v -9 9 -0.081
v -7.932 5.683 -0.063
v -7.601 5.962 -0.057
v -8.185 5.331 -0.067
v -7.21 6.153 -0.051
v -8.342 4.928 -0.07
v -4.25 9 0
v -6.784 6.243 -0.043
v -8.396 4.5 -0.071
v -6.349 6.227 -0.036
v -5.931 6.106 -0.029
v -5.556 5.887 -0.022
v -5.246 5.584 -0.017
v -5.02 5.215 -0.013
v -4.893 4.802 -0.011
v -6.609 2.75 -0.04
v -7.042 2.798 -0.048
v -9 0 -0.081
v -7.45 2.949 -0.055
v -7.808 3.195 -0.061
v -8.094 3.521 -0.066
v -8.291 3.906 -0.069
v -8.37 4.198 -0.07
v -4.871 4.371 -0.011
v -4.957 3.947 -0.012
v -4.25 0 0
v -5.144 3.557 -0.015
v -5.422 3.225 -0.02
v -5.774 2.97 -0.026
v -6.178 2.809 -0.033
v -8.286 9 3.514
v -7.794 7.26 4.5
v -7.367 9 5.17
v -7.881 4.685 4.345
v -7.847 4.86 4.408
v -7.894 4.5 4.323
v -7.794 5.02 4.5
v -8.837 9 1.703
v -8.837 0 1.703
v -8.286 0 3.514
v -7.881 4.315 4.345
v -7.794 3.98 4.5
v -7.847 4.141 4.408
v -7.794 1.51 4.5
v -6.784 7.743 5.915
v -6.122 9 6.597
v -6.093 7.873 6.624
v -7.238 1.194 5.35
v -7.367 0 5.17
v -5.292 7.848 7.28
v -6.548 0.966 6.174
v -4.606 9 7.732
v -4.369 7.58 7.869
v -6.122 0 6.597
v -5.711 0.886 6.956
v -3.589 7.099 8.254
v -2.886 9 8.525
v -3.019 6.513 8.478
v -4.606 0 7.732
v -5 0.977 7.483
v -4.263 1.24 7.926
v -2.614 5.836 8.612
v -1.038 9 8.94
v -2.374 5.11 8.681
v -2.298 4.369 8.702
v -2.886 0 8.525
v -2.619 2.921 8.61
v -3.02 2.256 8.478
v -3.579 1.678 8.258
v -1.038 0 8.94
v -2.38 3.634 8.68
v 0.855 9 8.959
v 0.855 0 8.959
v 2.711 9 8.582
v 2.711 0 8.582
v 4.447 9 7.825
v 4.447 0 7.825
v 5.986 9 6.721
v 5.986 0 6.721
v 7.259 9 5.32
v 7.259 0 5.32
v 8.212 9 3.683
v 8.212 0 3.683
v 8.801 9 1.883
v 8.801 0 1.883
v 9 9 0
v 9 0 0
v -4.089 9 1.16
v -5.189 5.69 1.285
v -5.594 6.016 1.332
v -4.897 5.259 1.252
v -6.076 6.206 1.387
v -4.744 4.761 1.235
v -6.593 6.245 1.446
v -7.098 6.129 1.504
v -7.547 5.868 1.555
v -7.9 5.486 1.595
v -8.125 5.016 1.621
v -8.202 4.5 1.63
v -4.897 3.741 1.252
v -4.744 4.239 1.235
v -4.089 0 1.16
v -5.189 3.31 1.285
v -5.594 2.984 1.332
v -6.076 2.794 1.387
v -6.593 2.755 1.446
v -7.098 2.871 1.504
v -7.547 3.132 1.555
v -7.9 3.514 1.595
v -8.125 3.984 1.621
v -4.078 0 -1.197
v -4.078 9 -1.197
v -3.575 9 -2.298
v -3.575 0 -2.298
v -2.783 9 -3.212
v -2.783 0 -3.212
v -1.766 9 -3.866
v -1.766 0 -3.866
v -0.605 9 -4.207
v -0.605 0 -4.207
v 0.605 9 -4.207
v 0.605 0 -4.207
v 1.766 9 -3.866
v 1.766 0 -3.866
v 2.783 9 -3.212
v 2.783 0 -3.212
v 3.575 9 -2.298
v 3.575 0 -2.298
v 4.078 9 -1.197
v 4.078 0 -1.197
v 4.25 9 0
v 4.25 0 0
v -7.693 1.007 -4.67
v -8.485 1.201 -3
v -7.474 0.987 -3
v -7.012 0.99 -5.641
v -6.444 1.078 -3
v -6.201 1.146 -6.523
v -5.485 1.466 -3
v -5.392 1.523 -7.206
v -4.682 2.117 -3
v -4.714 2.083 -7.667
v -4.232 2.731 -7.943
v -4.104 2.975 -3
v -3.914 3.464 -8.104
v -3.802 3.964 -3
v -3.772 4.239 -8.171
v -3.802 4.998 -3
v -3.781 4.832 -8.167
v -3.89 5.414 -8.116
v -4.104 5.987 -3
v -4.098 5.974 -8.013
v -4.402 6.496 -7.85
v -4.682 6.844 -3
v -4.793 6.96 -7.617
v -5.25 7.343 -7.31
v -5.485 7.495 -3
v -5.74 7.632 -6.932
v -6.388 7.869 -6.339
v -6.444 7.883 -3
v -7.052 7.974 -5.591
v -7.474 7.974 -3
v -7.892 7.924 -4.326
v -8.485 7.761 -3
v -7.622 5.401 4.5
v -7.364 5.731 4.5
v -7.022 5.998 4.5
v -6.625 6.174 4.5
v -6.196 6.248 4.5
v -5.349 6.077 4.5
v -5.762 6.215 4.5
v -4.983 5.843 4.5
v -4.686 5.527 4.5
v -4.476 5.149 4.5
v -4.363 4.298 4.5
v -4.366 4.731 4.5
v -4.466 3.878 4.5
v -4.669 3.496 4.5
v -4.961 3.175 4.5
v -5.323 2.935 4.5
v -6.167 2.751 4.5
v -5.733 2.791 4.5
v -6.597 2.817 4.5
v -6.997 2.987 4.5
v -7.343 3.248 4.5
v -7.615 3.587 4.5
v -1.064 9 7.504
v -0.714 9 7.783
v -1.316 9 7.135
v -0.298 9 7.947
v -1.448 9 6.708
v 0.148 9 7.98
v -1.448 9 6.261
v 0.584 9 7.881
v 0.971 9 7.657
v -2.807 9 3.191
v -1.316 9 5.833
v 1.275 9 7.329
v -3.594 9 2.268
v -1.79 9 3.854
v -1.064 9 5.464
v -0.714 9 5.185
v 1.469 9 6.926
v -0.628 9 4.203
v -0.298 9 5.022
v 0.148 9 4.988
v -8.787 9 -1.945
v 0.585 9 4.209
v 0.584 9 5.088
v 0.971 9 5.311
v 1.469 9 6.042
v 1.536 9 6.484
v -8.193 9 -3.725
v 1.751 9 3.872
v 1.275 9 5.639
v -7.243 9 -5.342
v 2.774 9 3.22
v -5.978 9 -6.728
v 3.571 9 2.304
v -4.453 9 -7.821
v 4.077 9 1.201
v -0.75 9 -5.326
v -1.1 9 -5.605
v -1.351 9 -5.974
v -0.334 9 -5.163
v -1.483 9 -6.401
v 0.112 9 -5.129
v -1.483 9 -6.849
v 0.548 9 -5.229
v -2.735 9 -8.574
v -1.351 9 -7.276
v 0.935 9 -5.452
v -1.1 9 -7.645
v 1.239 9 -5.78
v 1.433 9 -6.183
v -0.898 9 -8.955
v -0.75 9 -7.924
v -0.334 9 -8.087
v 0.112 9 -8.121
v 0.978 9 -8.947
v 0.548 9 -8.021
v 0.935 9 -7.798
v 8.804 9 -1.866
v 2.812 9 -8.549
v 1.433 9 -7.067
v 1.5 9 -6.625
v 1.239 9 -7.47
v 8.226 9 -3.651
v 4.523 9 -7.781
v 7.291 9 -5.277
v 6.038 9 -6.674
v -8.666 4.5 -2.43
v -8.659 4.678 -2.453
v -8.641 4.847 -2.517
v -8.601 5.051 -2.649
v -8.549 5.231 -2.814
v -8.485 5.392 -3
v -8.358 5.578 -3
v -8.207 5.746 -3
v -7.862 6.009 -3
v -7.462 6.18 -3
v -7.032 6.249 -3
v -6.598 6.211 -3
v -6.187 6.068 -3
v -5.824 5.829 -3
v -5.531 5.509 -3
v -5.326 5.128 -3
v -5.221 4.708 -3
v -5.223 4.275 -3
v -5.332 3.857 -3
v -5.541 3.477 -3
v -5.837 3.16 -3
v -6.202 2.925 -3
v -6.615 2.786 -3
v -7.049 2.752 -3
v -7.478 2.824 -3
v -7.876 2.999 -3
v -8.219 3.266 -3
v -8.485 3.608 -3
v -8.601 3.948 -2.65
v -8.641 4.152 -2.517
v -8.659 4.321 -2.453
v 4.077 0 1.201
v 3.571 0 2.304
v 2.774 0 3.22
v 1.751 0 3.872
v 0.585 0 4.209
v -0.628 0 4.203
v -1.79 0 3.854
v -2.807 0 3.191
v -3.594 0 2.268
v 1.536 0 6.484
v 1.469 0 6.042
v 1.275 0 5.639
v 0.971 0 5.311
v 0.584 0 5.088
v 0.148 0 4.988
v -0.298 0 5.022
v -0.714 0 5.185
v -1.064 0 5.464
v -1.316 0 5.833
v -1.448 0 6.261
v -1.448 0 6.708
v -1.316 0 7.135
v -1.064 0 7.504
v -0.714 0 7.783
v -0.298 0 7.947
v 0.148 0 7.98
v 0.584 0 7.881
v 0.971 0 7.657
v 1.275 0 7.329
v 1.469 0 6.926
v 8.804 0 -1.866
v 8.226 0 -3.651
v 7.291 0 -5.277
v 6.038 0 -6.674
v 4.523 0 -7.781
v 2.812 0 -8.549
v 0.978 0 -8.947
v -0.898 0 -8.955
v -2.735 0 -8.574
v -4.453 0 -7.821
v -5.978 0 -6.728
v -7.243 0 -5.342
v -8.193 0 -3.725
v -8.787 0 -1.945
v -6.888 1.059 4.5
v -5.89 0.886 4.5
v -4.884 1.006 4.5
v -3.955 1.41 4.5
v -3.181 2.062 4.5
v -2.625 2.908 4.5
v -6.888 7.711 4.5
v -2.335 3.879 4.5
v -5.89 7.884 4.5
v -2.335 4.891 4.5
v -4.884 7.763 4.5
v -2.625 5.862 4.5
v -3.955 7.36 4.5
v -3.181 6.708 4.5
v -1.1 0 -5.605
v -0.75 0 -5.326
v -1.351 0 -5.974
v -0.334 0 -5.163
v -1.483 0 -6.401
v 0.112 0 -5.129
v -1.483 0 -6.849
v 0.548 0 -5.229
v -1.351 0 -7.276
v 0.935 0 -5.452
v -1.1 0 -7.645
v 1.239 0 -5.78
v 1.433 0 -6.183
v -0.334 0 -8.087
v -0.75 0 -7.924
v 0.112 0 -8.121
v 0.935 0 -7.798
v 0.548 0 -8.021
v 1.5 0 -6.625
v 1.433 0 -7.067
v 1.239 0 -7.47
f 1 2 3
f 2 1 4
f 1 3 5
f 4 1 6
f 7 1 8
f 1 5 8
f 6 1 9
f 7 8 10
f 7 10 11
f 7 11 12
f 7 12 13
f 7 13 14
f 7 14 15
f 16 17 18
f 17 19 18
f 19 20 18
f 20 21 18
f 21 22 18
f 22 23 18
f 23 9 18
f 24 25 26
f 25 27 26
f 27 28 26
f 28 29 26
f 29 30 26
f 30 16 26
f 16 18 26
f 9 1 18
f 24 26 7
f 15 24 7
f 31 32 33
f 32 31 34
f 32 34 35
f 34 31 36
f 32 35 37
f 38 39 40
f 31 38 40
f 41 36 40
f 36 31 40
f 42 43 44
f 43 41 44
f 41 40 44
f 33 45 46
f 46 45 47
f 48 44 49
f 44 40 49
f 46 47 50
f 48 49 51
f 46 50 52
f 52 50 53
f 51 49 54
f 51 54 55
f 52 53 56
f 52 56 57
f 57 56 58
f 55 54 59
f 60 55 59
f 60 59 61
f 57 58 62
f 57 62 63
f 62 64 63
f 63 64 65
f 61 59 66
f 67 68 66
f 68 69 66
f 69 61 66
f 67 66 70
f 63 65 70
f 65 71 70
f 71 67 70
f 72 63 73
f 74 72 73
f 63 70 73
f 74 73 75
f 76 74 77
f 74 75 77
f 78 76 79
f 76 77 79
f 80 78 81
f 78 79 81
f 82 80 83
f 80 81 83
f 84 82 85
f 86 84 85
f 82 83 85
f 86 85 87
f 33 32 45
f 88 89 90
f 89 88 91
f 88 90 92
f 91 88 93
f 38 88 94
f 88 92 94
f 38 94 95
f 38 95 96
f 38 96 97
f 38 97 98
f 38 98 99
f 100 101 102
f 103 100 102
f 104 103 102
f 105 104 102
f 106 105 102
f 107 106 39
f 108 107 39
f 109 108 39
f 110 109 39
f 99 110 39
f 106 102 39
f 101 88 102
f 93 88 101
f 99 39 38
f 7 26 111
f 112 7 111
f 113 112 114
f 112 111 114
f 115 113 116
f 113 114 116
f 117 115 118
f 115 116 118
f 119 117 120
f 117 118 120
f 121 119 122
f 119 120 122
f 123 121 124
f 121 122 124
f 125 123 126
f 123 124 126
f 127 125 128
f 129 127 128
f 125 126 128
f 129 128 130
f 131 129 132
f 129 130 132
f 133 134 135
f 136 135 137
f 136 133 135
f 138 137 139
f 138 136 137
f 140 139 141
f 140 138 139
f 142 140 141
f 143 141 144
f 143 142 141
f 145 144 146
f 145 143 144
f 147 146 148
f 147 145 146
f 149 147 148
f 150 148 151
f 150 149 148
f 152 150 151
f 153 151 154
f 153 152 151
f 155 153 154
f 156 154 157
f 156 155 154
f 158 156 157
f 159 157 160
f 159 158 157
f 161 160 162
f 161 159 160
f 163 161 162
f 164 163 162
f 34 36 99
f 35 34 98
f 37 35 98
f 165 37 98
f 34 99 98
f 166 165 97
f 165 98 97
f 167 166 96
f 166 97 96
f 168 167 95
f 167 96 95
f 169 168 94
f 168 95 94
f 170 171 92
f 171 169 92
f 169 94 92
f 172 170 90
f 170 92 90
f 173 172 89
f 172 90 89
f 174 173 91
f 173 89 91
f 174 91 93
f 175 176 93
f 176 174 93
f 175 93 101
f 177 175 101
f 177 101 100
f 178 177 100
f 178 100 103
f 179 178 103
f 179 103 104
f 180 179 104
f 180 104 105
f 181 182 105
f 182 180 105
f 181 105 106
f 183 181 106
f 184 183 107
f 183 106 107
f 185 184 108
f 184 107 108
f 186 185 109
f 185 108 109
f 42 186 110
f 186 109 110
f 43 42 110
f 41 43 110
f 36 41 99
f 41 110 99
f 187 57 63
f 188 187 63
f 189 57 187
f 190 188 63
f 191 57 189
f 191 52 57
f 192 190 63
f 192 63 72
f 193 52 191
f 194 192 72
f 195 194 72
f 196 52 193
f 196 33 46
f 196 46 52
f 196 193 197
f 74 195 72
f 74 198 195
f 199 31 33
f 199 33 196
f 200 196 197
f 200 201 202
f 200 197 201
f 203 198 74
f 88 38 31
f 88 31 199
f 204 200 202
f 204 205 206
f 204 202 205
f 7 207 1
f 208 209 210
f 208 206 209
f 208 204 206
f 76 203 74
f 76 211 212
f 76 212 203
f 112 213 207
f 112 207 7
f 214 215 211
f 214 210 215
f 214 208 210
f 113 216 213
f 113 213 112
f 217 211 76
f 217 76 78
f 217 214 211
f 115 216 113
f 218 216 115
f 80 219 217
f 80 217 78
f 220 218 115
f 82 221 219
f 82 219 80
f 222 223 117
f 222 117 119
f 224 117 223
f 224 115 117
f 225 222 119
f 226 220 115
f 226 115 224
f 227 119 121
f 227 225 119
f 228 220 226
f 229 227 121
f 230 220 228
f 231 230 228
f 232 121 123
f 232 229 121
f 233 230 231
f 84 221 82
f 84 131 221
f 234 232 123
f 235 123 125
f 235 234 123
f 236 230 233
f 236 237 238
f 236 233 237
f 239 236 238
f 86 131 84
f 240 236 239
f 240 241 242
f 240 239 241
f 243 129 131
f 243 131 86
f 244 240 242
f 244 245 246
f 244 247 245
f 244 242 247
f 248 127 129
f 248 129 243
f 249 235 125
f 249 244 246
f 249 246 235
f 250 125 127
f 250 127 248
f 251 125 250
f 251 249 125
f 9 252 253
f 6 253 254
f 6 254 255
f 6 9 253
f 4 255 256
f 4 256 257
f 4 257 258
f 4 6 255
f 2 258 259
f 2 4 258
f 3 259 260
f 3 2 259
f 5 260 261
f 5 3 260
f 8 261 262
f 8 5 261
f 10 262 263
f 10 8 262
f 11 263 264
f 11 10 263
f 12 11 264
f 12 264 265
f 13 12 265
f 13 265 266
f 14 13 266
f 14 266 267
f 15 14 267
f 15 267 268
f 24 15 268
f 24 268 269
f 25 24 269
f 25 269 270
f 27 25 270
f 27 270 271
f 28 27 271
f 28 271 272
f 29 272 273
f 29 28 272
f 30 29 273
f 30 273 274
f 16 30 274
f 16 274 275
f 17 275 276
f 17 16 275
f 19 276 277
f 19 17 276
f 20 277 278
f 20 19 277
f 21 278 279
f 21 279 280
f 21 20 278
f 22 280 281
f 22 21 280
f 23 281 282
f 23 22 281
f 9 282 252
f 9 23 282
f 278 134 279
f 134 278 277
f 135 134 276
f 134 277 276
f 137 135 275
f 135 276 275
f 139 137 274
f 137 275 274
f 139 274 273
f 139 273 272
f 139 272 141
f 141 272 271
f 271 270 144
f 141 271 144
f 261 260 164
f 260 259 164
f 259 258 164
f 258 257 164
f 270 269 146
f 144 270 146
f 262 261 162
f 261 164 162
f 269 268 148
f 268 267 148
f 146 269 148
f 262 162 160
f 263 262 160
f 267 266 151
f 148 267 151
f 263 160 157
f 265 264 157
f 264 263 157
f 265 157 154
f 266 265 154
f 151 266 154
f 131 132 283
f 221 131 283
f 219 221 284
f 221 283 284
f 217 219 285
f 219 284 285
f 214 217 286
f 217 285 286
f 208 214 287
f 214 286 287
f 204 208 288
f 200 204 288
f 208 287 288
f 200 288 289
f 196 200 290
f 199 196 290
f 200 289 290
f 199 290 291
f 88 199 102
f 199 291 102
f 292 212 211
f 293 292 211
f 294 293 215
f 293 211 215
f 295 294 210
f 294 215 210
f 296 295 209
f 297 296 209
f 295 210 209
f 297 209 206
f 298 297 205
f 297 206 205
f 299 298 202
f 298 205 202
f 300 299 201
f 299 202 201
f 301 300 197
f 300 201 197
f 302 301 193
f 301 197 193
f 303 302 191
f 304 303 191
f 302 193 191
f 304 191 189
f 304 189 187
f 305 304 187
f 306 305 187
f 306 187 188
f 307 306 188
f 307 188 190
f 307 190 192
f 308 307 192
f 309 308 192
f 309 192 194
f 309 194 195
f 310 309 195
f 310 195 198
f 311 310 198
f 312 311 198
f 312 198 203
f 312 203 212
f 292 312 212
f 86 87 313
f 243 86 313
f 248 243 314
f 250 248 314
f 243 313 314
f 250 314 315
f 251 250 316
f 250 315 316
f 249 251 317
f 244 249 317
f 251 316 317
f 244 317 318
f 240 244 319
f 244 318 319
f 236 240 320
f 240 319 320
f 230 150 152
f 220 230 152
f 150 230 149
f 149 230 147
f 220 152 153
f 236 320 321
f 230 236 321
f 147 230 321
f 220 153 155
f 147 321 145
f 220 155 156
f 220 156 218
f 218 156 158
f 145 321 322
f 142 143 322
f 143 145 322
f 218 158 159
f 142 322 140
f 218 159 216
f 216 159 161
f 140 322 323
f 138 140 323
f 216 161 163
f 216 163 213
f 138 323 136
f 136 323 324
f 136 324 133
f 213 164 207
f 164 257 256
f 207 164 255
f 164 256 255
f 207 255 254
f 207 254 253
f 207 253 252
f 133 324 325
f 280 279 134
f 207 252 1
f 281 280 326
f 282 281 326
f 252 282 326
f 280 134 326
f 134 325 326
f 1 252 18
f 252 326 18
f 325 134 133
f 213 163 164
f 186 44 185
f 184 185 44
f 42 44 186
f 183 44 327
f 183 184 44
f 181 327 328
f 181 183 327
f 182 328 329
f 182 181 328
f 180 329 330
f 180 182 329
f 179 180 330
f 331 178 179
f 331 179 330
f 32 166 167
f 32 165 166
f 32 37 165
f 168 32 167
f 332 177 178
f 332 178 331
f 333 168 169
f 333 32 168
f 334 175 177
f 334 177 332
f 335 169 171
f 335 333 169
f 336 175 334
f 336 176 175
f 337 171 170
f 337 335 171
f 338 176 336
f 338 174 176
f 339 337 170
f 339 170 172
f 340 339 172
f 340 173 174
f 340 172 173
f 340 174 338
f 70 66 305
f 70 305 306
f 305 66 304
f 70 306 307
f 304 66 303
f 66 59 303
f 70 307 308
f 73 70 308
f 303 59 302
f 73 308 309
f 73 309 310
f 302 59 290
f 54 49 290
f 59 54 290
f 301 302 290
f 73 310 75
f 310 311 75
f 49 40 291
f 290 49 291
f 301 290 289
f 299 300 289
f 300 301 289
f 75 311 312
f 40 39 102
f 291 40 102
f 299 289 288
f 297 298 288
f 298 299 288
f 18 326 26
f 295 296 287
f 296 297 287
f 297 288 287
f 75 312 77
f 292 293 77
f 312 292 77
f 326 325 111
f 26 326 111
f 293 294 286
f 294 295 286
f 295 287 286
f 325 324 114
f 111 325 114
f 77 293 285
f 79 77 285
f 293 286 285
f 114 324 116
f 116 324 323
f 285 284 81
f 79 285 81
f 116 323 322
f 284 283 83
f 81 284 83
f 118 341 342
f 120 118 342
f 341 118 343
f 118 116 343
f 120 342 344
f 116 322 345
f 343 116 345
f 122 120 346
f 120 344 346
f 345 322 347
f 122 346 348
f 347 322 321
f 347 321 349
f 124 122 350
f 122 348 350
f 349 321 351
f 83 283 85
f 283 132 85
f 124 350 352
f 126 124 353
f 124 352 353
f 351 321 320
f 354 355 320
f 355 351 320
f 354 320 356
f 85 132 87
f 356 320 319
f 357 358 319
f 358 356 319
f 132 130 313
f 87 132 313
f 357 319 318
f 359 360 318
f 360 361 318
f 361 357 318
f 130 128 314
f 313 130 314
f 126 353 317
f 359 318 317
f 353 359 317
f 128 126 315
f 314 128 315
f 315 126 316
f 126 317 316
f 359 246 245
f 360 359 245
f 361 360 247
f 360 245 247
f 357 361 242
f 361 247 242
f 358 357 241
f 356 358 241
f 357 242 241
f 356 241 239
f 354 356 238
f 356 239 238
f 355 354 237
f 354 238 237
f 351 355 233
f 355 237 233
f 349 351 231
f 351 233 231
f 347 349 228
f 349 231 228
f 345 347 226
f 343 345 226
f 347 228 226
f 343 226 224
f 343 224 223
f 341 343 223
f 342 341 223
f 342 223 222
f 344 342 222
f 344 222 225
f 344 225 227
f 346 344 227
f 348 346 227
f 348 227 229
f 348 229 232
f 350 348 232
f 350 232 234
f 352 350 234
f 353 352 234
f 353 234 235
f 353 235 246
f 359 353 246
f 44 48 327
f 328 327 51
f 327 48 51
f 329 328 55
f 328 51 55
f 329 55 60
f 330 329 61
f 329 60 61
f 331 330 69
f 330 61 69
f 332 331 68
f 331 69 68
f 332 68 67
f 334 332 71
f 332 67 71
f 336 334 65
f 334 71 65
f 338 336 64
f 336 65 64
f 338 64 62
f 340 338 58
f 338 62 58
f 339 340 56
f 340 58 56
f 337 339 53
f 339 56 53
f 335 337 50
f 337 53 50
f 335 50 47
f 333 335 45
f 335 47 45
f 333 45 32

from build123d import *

# Parameters (mm, degrees)
BOSS_EXTRUDE1_DEPTH     = 9
SKETCH2_R               = 1.75
CUT_EXTRUDE1_DEPTH      = 11.651759691
CUT_EXTRUDE1_DEPTH_BACK = 10.276217487
SKETCH3_R               = 3.5
CUT_EXTRUDE2_DEPTH      = 5.5
SKETCH4_R               = 3.5
CUT_EXTRUDE3_DEPTH      = 7
SKETCH5_R               = 1.5
CUT_EXTRUDE4_DEPTH      = 10.0000001


with BuildPart() as part:
    # Sketch1 → Boss-Extrude1 (new body)
    with BuildSketch(Plane(origin=(0, 0, 0), x_dir=(1, 0, 0), z_dir=(0, 1, 0))):
        with BuildLine():
            ThreePointArc((9, 0), (0.040582687, 8.999908502), (-8.99963401, 0.081164549))
            Line((-8.99963401, 0.081164549), (-4.25, 0))
            ThreePointArc((-4.25, 0), (0, 4.25), (4.25, 0))
            ThreePointArc((4.25, 0), (0.585435043, -4.209485219), (-4.088713322, -1.159708311))
            Line((-4.088713322, -1.159708311), (-8.837484751, -1.702604851))
            ThreePointArc((-8.837484751, -1.702604851), (0.855171691, -8.959279066), (9, 0))
        make_face()
    extrude(amount=BOSS_EXTRUDE1_DEPTH)

    # Sketch2 → Cut-Extrude1 (cut, two sides)
    with BuildSketch(Plane(origin=(0.078121964, 0, 0.683340793), x_dir=(-0.993528428, 0, 0.113583725), z_dir=(-0.113583725, 0, -0.993528428))) as cut_extrude1_sk:
        with Locations((6.583828722, 4.5)):
            Circle(SKETCH2_R)
    extrude(amount=CUT_EXTRUDE1_DEPTH, mode=Mode.SUBTRACT)
    extrude(cut_extrude1_sk.sketch, amount=-CUT_EXTRUDE1_DEPTH_BACK, mode=Mode.SUBTRACT)

    # Sketch3 → Cut-Extrude2 (cut)
    with BuildSketch(Plane.XY.offset(10)):
        with Locations((-5.798386902, 4.384929451)):
            Circle(SKETCH3_R)
    extrude(amount=-CUT_EXTRUDE2_DEPTH, mode=Mode.SUBTRACT)

    # Sketch4 → Cut-Extrude3 (cut)
    with BuildSketch(Plane.XY.offset(-10)):
        with Locations((-7.26360584, 4.480644852)):
            Circle(SKETCH4_R)
    extrude(amount=CUT_EXTRUDE3_DEPTH, mode=Mode.SUBTRACT)

    # Sketch5 → Cut-Extrude4 (cut, through all)
    with BuildSketch(Plane(origin=(0, 9, 0), x_dir=(1, 0, 0), z_dir=(0, 1, 0))):
        with Locations((0.035505664, -6.484233459)):
            Circle(SKETCH5_R)
        with Locations((0, 6.625)):
            Circle(SKETCH5_R)
    extrude(amount=-CUT_EXTRUDE4_DEPTH, mode=Mode.SUBTRACT)


solid = part.part
